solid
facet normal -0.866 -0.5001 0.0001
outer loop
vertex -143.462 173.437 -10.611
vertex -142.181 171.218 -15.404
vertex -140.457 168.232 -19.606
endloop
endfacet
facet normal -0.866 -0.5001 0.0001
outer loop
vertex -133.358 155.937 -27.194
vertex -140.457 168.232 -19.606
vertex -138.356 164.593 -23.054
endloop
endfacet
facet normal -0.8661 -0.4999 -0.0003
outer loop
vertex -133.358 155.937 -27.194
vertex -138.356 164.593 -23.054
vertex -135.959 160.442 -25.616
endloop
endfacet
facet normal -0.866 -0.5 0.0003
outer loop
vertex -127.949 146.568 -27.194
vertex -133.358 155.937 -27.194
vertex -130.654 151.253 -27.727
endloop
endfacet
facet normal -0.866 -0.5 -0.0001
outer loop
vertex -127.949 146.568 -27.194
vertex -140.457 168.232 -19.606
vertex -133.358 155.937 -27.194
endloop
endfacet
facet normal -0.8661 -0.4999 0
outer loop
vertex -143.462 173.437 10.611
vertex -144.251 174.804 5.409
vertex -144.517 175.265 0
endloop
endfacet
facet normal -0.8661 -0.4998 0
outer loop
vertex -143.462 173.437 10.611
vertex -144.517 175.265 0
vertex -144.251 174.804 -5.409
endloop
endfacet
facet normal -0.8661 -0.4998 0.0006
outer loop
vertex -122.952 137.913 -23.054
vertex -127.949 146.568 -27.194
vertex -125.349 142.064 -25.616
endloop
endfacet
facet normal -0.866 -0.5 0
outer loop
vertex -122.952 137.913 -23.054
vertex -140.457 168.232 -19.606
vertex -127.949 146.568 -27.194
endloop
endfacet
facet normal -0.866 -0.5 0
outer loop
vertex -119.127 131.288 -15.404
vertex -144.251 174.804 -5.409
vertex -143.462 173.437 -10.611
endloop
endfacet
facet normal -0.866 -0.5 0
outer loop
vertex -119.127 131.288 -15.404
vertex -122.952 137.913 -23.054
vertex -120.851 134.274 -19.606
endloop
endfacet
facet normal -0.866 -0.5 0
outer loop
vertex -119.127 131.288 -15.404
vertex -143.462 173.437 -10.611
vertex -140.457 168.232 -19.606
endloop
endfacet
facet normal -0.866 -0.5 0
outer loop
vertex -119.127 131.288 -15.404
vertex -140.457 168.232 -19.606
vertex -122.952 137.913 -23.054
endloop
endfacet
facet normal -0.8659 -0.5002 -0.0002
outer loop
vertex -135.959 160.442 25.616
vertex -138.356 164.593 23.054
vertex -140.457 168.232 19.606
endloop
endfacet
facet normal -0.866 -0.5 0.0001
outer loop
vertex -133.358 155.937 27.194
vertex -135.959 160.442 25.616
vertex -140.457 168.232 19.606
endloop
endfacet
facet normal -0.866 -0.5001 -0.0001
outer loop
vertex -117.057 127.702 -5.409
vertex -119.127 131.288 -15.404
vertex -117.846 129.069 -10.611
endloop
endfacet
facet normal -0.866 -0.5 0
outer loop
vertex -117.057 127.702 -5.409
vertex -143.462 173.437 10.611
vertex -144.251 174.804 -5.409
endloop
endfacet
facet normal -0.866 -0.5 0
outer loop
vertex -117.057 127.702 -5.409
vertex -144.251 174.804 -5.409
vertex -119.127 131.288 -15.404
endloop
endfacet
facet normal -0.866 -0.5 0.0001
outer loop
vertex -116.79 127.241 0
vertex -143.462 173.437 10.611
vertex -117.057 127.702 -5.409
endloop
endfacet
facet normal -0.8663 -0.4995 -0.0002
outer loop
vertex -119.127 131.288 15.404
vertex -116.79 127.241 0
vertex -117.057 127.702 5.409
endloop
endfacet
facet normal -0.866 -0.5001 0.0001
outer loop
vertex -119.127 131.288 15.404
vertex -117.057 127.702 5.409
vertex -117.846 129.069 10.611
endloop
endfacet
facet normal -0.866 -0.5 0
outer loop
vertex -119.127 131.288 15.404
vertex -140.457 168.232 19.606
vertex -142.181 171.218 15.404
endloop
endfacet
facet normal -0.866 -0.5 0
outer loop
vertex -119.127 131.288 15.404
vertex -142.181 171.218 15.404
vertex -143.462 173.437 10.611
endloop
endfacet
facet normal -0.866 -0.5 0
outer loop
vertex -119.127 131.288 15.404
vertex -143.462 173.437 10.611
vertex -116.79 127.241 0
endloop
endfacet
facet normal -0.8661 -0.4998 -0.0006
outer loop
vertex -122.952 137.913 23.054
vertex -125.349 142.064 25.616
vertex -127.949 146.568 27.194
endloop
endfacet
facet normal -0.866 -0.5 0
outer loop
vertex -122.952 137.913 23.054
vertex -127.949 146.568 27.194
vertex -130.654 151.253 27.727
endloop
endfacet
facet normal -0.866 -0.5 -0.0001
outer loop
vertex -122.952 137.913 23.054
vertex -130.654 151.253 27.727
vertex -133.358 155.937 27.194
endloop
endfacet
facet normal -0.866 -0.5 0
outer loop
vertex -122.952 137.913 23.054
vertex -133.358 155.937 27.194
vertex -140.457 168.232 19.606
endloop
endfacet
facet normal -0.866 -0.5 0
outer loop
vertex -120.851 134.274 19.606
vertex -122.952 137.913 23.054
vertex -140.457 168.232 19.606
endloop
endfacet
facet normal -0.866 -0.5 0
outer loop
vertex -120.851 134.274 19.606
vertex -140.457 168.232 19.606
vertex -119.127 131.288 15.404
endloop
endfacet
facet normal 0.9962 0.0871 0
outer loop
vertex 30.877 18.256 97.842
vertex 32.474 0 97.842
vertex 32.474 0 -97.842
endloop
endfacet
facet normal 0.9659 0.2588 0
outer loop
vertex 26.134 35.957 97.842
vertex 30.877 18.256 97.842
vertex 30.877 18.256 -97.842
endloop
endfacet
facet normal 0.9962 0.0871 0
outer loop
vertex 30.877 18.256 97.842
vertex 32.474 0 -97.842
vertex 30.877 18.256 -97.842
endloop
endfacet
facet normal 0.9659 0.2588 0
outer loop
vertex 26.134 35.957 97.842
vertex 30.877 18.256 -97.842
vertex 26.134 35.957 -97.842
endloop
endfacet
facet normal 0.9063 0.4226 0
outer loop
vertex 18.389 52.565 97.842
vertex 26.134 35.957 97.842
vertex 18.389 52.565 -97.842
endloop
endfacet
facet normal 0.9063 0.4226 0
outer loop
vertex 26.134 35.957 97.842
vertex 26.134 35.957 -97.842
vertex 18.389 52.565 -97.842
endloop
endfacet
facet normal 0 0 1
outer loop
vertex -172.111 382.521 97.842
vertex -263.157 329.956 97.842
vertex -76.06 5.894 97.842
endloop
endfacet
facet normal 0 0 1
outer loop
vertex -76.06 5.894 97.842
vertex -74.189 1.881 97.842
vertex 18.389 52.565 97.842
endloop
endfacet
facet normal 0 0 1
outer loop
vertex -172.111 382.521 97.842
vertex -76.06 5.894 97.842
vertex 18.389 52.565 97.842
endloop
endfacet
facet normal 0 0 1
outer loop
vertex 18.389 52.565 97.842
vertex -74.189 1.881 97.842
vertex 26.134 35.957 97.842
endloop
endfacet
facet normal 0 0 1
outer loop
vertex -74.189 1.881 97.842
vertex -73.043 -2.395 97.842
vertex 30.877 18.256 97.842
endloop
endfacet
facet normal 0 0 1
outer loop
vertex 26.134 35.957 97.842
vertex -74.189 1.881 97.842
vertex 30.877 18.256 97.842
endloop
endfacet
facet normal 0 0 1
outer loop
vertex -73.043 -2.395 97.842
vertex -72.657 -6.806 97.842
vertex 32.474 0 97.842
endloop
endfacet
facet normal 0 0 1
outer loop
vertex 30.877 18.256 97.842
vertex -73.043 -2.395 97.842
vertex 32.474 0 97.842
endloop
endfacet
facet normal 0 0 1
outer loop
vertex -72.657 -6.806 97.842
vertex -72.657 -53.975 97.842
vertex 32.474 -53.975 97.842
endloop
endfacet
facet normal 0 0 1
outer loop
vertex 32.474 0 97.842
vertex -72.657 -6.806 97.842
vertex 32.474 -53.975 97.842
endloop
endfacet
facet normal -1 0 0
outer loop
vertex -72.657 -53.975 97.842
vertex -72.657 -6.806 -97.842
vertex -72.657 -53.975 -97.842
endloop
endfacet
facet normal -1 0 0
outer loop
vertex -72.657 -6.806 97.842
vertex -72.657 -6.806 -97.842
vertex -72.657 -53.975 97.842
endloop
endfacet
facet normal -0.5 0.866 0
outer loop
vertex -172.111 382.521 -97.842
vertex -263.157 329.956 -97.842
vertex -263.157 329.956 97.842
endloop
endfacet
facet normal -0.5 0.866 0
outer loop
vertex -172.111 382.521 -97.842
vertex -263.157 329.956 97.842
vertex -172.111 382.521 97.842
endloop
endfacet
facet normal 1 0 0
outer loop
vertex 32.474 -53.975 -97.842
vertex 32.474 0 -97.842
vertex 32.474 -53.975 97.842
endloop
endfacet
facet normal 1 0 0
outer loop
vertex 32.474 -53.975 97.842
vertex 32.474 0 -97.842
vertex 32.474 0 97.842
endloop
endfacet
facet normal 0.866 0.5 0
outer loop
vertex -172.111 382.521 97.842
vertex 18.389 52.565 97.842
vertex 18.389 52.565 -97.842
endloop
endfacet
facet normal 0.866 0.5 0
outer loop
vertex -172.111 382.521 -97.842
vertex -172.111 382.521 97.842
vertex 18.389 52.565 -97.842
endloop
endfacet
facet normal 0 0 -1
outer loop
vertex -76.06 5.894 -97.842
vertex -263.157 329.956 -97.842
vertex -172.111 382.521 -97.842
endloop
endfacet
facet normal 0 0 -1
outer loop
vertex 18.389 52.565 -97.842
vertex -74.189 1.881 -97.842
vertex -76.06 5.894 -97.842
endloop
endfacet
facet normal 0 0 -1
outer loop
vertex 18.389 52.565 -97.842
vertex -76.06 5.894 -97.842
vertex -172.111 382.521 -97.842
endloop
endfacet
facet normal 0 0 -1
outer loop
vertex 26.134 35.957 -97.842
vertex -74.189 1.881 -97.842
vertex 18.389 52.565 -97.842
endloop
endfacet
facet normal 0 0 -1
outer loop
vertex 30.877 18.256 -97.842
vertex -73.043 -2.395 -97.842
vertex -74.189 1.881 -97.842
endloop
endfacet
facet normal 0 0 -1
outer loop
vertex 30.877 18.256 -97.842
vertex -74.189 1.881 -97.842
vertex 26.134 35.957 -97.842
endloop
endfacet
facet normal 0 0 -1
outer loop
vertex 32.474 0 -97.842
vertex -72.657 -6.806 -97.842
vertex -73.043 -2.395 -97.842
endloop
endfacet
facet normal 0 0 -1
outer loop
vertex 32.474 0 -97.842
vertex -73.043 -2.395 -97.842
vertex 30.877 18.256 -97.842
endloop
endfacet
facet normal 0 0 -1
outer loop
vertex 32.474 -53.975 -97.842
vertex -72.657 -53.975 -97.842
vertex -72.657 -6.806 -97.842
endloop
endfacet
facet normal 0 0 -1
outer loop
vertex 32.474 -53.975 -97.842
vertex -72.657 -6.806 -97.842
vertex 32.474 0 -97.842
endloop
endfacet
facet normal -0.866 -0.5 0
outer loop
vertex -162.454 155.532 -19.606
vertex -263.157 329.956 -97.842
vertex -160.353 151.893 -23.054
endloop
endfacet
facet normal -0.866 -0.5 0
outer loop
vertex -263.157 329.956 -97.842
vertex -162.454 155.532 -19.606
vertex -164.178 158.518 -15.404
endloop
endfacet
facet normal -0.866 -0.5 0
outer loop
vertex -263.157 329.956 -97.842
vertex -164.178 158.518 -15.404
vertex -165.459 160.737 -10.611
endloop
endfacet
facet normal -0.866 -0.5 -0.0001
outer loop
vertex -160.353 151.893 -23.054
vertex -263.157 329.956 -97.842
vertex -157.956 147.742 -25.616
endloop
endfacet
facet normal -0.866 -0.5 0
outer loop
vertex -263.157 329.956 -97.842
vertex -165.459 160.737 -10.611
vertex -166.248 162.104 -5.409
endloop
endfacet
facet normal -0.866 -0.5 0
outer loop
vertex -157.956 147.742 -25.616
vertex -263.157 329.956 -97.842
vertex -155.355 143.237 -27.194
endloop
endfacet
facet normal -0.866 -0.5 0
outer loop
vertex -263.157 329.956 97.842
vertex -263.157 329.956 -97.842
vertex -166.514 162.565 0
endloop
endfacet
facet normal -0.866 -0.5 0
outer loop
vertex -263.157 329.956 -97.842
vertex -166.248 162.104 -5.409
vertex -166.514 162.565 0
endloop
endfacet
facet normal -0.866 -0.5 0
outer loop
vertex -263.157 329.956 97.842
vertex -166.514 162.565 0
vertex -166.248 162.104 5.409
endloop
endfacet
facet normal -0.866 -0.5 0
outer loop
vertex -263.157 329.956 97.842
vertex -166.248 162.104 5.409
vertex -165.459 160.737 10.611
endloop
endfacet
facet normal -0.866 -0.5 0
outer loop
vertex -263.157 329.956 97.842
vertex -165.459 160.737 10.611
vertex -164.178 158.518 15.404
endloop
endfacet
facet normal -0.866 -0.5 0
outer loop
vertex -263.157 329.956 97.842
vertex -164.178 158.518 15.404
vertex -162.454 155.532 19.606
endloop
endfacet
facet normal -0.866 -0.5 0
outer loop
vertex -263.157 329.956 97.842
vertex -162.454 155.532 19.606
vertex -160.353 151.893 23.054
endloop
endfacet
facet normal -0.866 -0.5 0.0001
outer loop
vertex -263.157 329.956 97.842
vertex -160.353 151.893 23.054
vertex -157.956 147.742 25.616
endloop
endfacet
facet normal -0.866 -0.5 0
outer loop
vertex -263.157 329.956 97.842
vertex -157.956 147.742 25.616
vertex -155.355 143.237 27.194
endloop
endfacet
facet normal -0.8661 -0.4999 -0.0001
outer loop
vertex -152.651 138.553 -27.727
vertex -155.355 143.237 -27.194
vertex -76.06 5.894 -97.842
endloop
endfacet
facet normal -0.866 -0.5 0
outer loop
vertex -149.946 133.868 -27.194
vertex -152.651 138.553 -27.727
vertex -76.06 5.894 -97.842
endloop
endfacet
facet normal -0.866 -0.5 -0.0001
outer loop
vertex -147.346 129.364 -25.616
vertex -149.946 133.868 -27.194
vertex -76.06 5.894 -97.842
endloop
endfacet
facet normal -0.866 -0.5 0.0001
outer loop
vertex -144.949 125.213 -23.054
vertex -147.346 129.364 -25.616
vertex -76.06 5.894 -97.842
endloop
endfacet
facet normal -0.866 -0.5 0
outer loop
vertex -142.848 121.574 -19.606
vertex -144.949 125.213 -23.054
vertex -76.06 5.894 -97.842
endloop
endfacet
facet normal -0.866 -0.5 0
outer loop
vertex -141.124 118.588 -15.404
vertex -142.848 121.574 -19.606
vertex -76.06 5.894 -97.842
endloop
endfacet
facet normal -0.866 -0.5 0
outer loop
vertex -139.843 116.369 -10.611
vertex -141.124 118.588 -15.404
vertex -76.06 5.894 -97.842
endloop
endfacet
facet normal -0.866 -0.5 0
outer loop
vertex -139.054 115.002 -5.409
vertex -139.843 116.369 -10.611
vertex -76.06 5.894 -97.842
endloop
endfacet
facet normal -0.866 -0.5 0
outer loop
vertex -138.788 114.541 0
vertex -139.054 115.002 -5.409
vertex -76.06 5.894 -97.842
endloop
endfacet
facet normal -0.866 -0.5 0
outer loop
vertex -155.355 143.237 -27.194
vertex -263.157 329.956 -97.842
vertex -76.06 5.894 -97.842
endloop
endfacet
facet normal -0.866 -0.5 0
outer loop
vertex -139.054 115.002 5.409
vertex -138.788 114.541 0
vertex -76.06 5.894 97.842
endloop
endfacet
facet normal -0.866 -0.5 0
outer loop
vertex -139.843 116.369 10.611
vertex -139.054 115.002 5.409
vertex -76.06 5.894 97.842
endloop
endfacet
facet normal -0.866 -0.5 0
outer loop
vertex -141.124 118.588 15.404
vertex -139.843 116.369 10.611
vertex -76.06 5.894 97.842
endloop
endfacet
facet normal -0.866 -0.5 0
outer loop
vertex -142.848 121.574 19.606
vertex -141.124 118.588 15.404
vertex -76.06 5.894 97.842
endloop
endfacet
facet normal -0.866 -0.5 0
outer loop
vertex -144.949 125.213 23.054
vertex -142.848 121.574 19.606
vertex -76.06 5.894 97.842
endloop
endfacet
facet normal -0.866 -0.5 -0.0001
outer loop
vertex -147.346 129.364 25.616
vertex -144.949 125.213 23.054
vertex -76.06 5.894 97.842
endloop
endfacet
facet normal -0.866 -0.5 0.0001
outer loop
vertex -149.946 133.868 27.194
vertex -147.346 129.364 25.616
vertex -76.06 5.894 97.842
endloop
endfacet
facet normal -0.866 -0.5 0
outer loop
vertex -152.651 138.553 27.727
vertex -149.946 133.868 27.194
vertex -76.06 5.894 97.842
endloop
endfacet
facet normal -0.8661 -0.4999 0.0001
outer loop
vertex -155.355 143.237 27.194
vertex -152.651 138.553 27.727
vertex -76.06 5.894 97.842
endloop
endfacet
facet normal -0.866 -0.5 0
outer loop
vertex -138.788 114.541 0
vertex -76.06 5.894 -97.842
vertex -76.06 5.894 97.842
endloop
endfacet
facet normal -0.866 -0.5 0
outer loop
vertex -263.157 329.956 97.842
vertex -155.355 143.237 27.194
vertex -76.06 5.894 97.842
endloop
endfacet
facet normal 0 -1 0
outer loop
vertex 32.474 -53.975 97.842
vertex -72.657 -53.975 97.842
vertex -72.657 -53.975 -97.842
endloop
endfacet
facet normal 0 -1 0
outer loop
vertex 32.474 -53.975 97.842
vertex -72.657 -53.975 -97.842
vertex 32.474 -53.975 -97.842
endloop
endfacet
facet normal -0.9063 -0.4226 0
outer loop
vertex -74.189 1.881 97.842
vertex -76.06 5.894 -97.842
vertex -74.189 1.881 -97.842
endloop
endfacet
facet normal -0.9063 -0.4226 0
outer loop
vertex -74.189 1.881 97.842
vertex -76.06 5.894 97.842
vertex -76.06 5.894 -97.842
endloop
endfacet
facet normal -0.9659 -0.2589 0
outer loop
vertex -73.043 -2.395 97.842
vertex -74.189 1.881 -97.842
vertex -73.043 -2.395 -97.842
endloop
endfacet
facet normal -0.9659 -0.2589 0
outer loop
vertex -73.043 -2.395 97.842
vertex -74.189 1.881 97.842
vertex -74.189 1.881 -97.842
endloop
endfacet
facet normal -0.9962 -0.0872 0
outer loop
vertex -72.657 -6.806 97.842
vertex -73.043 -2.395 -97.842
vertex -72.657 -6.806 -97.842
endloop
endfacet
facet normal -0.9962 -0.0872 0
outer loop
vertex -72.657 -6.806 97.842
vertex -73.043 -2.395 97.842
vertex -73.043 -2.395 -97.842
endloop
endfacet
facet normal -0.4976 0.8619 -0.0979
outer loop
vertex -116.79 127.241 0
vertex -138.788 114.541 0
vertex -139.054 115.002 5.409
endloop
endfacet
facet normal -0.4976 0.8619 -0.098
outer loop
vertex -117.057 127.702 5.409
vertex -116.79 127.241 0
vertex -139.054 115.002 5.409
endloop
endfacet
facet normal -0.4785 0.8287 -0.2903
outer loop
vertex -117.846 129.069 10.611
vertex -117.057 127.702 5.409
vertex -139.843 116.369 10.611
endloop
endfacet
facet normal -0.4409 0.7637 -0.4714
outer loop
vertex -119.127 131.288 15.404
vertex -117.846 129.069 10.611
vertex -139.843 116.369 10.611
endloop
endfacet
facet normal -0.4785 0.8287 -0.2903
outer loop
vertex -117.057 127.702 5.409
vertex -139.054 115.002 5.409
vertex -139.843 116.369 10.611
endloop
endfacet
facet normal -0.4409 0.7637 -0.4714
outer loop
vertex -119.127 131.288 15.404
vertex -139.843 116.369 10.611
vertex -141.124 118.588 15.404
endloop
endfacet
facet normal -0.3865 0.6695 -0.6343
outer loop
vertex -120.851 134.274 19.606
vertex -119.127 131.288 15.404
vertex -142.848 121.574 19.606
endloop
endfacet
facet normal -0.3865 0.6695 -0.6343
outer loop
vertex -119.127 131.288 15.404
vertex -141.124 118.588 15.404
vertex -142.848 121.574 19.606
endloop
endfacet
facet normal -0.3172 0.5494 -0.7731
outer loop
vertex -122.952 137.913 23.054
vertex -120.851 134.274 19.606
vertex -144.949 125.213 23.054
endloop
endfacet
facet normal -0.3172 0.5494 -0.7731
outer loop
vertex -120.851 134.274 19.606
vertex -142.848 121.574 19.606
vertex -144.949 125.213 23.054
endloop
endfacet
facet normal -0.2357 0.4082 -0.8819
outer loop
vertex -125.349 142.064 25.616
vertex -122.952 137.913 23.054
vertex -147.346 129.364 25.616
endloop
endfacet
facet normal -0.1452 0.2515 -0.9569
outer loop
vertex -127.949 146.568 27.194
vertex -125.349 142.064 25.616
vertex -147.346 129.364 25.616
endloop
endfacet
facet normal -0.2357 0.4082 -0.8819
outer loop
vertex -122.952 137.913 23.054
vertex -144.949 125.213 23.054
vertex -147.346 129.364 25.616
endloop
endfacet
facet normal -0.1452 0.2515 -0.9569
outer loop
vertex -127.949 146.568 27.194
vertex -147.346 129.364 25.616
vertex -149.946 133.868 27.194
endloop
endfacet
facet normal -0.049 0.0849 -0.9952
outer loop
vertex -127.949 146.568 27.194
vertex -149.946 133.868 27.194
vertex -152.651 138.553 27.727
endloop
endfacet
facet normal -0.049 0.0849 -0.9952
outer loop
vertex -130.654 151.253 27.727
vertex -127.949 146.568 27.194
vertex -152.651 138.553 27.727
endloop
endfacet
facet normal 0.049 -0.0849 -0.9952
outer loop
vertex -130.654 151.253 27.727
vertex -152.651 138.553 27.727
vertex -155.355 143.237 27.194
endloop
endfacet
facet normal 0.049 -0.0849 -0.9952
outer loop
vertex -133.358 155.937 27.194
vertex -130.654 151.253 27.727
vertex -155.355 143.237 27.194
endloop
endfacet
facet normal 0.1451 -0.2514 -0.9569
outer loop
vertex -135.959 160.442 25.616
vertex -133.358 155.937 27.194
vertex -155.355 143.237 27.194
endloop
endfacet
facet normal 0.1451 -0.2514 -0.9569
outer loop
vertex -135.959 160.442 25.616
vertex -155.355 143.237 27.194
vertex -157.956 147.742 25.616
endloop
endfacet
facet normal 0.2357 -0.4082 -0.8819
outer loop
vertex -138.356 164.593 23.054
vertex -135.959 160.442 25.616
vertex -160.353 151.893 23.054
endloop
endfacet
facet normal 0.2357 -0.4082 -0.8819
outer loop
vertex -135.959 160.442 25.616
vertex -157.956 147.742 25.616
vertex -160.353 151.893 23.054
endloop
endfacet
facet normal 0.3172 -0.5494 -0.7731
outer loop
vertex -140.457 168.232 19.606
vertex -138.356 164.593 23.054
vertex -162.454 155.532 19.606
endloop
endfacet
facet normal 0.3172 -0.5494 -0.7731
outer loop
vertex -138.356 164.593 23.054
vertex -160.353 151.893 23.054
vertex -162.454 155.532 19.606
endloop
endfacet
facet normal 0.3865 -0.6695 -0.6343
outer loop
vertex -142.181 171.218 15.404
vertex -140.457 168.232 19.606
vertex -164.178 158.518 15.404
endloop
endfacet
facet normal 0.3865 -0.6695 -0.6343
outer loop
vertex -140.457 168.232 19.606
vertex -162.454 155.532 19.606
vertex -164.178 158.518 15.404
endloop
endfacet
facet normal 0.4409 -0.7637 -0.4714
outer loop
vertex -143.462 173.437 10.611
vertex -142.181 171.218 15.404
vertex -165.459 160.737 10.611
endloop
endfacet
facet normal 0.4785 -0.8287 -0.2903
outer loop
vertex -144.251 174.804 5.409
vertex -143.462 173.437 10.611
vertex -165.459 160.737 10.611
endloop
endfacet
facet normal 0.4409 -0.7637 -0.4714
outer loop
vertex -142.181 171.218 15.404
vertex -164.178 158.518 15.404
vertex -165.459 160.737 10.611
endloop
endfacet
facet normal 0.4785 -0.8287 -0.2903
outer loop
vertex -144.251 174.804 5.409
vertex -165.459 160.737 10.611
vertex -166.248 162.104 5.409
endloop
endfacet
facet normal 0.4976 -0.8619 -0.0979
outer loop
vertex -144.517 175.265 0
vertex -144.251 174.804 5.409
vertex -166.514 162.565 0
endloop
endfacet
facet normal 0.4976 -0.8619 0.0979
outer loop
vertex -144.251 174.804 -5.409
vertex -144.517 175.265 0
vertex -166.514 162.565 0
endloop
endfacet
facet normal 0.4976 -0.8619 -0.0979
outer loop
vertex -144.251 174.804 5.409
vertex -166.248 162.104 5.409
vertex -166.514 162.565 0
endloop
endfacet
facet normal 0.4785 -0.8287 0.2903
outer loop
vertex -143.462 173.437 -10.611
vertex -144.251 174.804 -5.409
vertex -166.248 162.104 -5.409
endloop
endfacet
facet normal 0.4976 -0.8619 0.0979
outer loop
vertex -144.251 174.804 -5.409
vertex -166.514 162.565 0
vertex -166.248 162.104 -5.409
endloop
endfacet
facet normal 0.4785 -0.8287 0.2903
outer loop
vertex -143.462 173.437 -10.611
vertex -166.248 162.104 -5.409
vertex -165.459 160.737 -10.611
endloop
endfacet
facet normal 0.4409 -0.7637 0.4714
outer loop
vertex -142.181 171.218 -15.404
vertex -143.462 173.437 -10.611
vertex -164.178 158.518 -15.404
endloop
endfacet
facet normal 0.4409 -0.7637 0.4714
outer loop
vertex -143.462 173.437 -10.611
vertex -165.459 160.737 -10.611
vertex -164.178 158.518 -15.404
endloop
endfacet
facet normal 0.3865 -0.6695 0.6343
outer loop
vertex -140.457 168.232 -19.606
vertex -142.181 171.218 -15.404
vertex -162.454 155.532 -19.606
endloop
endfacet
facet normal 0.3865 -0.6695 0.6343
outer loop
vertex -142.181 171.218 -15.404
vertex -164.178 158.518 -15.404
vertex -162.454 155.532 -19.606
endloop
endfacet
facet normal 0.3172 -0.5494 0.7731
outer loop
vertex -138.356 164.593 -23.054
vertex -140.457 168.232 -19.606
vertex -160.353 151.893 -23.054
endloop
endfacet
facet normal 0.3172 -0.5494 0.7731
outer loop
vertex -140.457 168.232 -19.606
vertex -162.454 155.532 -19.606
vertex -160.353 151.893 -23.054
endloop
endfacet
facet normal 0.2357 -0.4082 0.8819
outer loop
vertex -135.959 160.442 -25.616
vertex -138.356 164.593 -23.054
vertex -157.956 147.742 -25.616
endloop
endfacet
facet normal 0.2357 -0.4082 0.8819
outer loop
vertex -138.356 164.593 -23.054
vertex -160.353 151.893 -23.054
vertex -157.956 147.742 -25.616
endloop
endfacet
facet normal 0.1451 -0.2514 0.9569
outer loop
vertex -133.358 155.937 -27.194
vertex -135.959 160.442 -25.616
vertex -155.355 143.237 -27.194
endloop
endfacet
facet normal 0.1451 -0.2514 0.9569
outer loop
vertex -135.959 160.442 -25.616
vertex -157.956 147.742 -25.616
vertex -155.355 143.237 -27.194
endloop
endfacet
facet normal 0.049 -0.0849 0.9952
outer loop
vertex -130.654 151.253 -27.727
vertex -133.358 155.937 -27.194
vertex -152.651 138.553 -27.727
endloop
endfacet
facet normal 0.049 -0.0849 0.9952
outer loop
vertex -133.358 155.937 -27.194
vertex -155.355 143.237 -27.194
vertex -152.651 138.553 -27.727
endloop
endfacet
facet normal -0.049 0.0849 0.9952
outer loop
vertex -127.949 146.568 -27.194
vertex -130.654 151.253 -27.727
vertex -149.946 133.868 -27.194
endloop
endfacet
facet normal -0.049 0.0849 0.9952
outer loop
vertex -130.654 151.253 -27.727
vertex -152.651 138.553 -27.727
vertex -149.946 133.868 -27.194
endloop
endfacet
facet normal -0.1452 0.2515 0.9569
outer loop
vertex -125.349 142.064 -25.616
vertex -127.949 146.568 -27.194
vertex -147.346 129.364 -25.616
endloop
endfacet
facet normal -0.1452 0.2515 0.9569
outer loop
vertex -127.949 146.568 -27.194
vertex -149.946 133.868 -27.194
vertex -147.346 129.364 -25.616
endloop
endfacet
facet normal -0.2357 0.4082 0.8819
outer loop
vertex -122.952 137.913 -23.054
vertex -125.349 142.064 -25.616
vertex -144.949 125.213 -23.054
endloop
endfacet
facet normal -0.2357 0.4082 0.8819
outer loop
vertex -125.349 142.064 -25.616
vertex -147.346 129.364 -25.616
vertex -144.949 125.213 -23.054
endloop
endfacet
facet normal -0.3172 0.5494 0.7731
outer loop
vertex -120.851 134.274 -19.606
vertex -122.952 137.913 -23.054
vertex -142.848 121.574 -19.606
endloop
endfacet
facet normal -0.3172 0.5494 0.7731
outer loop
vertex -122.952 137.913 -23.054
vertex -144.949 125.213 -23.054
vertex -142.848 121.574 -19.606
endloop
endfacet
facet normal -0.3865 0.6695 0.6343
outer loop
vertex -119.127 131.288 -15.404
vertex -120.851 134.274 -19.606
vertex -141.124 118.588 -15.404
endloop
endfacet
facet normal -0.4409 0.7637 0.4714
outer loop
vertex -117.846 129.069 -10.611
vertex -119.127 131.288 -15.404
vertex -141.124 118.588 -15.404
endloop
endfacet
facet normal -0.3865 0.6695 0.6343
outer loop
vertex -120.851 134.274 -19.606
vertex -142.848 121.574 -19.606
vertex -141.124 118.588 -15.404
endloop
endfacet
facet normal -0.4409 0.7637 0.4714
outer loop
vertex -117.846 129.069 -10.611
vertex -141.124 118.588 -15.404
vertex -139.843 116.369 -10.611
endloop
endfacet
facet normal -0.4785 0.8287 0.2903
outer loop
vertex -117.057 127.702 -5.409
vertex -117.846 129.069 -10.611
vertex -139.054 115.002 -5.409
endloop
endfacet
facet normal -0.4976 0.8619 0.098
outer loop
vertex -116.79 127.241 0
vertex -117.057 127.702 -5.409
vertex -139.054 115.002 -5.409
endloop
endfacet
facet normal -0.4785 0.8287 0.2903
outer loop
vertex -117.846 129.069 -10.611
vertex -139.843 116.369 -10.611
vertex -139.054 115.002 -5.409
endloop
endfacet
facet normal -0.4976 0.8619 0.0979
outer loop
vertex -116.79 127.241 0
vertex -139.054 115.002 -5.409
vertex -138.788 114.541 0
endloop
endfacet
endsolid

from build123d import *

# Parameters (mm, degrees)
F0_W      = 105.1309853792
F0_H      = 195.6836879253
F1_DEPTH  = 53.975
F1_FACE_W = 105.1309853792
F1_FACE_H = 195.6836879253
F2_ANGLE  = 30
F3_DEPTH  = 381
F4_R      = 25.4
F5_R      = 27.7266508926
F6_DEPTH  = 25.4


with BuildPart() as f1:
    # F0 (on Front) → F1 (new body)
    with BuildSketch(Plane.XZ):
        with Locations((-20.0917944312, 0)):
            Rectangle(F0_W, F0_H)
    extrude(amount=F1_DEPTH)

    # F1_face (on face) → F2 (revolve)
    with BuildSketch(Plane(origin=(-20.0917944312, 0, 0), x_dir=(1, 0, 0), z_dir=(0, 1, 0))):
        Rectangle(F1_FACE_W, F1_FACE_H)
    revolve(axis=Axis((-72.6572871208, 0, 0), (0, 0, 1)), revolution_arc=F2_ANGLE)

    # F3 (add): a face of the model
    f3_faces = [f1.faces().sort_by_distance(p)[0] for p in [
        (-27.1342350892, 26.2827463448, 0),
    ]]
    extrude(f3_faces, amount=F3_DEPTH)

    # F4
    f4_edges = [f1.edges().sort_by_distance(p)[0] for p in [
        (-72.657287, 0, 0),
    ]]
    fillet(f4_edges, radius=F4_R)

    # F5 (on face) → F6 (cut)
    with BuildSketch(Plane(origin=(-54.4929653406, -31.4615282083, 0), x_dir=(0.5, -0.8660254038, 0), z_dir=(-0.8660254038, -0.5, 0))):
        with Locations((-196.3157951832, 0)):
            Circle(F5_R)
    extrude(amount=-F6_DEPTH, mode=Mode.SUBTRACT)


solid = f1.part
